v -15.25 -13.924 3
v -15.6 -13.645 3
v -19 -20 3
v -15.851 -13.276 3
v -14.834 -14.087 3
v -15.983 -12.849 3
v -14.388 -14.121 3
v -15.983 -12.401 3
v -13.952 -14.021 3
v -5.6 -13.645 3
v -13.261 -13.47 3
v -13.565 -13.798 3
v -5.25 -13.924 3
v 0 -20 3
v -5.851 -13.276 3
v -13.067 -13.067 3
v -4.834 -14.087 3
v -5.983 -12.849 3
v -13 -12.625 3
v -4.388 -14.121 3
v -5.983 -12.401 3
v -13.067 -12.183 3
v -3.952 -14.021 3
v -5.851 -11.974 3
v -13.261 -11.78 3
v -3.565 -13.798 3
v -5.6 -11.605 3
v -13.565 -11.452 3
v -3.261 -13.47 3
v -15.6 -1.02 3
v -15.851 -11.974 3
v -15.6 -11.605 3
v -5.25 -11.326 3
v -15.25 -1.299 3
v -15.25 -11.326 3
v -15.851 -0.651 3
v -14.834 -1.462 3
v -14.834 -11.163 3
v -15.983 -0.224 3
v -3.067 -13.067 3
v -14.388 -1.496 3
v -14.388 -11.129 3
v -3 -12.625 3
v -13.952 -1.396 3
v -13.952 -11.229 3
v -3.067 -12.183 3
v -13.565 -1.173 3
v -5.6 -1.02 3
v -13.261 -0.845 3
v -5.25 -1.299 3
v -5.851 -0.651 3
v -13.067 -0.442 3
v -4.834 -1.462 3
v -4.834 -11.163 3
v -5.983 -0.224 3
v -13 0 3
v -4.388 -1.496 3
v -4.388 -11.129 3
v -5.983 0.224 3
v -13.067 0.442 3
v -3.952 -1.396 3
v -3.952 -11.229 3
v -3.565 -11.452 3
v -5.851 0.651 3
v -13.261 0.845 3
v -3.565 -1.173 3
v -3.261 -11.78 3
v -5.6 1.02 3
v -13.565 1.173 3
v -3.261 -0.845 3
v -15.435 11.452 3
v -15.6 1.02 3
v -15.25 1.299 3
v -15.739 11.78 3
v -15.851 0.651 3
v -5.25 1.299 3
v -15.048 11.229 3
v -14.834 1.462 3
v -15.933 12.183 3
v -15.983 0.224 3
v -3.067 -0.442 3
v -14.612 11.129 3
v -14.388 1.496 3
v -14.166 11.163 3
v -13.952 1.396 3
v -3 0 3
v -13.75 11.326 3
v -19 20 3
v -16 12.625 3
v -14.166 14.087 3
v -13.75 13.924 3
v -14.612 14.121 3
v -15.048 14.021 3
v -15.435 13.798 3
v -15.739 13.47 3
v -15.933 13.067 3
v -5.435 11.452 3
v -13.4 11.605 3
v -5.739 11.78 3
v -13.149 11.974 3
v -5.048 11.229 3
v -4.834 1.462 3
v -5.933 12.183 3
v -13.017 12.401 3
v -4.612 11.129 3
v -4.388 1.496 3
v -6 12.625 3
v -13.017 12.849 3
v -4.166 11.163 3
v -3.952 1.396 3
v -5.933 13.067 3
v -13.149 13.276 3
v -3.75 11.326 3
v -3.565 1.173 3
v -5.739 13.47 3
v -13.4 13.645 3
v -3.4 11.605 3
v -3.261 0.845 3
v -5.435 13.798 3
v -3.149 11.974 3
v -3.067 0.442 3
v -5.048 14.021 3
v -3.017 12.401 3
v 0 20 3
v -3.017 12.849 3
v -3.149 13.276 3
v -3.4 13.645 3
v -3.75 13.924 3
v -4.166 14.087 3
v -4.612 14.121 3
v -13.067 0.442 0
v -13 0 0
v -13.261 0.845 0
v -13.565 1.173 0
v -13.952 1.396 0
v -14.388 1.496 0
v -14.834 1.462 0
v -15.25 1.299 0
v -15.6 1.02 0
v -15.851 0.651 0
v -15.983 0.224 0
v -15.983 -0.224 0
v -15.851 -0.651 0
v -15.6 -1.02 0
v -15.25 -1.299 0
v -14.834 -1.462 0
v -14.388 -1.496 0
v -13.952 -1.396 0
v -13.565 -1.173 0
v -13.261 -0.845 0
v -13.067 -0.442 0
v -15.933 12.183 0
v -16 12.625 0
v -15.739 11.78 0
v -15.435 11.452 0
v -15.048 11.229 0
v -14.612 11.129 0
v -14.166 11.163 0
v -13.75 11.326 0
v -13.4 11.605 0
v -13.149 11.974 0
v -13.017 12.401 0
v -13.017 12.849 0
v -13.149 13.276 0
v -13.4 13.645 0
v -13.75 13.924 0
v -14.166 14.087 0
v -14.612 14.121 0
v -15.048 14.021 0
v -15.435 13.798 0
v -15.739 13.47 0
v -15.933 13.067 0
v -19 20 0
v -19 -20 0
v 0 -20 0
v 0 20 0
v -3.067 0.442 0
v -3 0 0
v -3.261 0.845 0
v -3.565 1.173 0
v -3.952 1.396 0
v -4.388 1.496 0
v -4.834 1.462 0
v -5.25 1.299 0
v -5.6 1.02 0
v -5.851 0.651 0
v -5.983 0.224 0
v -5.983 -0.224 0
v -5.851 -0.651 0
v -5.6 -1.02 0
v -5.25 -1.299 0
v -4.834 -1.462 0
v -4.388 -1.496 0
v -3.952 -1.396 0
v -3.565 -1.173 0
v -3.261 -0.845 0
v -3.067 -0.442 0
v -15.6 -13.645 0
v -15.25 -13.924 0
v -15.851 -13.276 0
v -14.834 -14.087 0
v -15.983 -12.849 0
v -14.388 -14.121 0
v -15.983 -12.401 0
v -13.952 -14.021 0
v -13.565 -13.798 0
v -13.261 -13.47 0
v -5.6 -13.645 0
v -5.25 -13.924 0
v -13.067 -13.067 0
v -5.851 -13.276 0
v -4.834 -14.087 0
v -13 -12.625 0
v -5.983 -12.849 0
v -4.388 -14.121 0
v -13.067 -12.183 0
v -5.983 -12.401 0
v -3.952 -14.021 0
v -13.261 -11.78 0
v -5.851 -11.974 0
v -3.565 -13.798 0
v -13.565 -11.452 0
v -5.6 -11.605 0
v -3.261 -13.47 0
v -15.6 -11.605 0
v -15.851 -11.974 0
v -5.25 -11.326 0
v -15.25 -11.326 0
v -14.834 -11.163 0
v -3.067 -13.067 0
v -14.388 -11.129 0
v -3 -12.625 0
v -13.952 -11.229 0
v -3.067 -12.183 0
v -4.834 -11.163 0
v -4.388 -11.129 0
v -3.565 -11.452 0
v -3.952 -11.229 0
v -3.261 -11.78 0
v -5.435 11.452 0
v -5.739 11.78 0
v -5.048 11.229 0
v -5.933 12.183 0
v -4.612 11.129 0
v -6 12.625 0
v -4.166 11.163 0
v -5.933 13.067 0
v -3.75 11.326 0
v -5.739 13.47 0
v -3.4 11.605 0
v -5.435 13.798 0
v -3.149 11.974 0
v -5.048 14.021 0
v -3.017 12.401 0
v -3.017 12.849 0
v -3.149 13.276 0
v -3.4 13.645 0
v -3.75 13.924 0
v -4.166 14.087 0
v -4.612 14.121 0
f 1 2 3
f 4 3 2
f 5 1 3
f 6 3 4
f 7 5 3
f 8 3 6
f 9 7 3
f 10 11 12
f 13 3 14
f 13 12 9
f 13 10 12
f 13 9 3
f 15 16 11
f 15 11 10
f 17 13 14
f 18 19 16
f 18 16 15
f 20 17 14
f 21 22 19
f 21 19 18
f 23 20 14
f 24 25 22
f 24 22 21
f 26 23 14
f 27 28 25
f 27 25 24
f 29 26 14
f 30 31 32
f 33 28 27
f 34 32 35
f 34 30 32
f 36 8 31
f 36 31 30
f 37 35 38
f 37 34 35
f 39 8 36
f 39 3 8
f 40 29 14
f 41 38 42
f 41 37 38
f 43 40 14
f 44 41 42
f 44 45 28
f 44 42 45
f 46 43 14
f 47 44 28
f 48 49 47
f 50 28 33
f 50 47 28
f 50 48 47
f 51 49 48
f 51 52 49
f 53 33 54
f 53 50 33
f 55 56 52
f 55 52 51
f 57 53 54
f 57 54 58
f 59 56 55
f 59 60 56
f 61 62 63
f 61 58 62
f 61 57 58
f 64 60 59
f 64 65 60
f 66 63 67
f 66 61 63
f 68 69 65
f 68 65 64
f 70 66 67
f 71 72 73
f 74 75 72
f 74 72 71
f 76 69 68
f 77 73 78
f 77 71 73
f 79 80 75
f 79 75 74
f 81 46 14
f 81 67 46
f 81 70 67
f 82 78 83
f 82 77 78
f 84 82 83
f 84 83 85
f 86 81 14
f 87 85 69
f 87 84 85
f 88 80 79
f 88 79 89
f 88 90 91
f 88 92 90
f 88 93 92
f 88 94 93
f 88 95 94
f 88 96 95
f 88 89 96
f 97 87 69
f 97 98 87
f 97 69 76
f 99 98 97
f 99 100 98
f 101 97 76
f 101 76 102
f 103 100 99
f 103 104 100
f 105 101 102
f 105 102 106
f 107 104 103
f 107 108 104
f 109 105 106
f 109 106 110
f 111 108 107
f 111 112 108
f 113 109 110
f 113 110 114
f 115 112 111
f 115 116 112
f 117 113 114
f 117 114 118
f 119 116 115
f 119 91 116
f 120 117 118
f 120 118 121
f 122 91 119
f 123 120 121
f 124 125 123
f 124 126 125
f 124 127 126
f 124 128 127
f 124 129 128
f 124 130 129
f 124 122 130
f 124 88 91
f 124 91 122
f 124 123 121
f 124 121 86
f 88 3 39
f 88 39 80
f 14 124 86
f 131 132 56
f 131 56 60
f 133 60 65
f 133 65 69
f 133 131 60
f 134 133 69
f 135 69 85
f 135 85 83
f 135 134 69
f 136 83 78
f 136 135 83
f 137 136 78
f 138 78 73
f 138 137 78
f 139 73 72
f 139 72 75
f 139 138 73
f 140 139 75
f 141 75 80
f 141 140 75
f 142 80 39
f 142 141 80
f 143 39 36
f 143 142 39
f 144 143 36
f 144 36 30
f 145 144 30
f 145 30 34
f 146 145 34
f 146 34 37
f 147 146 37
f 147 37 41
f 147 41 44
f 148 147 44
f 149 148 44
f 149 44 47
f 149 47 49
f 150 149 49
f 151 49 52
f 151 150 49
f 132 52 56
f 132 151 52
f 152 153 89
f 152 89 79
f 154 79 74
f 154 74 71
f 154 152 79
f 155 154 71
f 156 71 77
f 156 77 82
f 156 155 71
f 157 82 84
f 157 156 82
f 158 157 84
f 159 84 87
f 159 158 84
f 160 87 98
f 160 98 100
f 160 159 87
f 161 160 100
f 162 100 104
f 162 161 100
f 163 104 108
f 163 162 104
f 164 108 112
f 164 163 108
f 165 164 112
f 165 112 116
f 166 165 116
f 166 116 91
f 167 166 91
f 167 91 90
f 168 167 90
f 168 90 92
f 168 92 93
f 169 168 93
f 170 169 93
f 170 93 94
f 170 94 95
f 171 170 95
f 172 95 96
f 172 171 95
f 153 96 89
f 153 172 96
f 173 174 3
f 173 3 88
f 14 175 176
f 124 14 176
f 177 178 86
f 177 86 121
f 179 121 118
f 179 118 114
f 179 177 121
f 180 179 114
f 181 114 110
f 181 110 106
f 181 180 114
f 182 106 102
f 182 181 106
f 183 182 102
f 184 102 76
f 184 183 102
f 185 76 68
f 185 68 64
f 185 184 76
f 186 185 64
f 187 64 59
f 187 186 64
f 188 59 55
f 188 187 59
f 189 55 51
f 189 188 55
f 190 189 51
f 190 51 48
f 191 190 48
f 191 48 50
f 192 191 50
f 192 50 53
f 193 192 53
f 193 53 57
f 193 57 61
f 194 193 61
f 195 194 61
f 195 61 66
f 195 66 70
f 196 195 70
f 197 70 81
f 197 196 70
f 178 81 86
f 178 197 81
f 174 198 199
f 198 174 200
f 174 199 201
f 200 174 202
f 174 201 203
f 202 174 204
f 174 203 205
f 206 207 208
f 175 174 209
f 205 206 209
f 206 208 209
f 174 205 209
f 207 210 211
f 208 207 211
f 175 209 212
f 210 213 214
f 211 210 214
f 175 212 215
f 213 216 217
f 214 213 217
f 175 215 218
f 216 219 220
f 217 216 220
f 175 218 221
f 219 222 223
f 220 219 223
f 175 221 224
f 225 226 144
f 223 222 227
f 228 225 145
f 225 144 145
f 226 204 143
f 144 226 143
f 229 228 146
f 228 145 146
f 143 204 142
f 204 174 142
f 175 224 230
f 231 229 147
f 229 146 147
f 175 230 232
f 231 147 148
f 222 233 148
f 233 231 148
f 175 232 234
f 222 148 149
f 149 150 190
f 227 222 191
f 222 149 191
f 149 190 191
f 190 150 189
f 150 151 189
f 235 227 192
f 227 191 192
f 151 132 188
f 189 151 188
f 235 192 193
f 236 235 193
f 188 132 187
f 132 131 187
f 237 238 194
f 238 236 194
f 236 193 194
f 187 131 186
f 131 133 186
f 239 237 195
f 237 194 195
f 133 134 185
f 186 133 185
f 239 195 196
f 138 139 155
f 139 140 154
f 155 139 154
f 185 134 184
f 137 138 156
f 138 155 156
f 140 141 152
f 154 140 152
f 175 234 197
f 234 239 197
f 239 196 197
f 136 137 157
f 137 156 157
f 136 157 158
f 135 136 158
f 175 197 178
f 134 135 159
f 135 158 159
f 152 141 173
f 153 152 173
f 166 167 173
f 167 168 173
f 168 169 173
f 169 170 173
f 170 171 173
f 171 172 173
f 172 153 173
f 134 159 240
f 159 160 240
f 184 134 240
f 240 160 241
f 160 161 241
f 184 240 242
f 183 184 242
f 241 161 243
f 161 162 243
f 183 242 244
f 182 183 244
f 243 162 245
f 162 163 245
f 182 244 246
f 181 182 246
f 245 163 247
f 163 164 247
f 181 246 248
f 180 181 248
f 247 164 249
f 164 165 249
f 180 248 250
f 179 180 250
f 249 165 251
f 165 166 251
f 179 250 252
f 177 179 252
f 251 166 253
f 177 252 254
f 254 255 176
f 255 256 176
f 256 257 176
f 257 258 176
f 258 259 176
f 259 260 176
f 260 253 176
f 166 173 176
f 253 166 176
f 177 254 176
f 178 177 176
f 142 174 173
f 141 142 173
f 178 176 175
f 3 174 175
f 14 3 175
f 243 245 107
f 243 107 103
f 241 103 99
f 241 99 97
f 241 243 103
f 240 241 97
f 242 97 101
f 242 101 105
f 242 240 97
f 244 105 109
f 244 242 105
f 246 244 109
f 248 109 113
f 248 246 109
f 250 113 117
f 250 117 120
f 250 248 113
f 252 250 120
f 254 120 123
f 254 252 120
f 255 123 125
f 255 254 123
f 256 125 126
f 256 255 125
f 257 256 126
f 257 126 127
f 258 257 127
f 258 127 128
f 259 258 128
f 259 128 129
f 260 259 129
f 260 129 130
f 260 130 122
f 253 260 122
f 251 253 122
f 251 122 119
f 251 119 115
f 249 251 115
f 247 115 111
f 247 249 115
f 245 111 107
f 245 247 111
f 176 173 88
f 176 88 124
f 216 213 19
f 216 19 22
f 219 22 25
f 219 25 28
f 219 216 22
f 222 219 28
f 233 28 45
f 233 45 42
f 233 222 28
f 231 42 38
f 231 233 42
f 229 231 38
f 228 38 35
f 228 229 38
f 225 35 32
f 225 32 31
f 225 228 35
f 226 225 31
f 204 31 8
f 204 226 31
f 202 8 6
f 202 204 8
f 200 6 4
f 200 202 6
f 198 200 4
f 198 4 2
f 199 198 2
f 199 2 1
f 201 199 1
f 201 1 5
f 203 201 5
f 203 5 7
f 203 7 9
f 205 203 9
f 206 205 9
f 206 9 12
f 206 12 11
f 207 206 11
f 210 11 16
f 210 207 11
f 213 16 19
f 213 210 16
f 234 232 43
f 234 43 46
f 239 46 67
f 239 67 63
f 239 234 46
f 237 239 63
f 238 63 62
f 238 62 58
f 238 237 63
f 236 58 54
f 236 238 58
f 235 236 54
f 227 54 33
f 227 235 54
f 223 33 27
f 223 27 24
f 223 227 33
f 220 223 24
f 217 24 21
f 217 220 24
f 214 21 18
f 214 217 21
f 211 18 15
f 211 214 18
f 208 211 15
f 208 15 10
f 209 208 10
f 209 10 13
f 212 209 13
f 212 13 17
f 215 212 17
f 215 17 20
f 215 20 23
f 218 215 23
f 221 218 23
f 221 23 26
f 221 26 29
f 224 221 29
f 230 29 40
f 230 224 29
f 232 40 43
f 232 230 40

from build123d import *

# Parameters (mm, degrees)
SKETCH12_W          = 19
SKETCH12_H          = 40
SKETCH12_R          = 1.5
BOSS_EXTRUDE6_DEPTH = 3


with BuildPart() as part:
    # Sketch12 → Boss-Extrude6 (new body)
    with BuildSketch(Plane.XY):
        with Locations((-9.5, 0)):
            Rectangle(SKETCH12_W, SKETCH12_H)
        with Locations((-4.5, 0)):
            Circle(SKETCH12_R, mode=Mode.SUBTRACT)
        with Locations((-4.5, -12.625)):
            Circle(SKETCH12_R, mode=Mode.SUBTRACT)
        with Locations((-14.5, -12.625)):
            Circle(SKETCH12_R, mode=Mode.SUBTRACT)
        with Locations((-4.5, 12.625)):
            Circle(SKETCH12_R, mode=Mode.SUBTRACT)
        with Locations((-14.5, 12.625)):
            Circle(SKETCH12_R, mode=Mode.SUBTRACT)
        with Locations((-14.5, 0)):
            Circle(SKETCH12_R, mode=Mode.SUBTRACT)
    extrude(amount=BOSS_EXTRUDE6_DEPTH)


solid = part.part
